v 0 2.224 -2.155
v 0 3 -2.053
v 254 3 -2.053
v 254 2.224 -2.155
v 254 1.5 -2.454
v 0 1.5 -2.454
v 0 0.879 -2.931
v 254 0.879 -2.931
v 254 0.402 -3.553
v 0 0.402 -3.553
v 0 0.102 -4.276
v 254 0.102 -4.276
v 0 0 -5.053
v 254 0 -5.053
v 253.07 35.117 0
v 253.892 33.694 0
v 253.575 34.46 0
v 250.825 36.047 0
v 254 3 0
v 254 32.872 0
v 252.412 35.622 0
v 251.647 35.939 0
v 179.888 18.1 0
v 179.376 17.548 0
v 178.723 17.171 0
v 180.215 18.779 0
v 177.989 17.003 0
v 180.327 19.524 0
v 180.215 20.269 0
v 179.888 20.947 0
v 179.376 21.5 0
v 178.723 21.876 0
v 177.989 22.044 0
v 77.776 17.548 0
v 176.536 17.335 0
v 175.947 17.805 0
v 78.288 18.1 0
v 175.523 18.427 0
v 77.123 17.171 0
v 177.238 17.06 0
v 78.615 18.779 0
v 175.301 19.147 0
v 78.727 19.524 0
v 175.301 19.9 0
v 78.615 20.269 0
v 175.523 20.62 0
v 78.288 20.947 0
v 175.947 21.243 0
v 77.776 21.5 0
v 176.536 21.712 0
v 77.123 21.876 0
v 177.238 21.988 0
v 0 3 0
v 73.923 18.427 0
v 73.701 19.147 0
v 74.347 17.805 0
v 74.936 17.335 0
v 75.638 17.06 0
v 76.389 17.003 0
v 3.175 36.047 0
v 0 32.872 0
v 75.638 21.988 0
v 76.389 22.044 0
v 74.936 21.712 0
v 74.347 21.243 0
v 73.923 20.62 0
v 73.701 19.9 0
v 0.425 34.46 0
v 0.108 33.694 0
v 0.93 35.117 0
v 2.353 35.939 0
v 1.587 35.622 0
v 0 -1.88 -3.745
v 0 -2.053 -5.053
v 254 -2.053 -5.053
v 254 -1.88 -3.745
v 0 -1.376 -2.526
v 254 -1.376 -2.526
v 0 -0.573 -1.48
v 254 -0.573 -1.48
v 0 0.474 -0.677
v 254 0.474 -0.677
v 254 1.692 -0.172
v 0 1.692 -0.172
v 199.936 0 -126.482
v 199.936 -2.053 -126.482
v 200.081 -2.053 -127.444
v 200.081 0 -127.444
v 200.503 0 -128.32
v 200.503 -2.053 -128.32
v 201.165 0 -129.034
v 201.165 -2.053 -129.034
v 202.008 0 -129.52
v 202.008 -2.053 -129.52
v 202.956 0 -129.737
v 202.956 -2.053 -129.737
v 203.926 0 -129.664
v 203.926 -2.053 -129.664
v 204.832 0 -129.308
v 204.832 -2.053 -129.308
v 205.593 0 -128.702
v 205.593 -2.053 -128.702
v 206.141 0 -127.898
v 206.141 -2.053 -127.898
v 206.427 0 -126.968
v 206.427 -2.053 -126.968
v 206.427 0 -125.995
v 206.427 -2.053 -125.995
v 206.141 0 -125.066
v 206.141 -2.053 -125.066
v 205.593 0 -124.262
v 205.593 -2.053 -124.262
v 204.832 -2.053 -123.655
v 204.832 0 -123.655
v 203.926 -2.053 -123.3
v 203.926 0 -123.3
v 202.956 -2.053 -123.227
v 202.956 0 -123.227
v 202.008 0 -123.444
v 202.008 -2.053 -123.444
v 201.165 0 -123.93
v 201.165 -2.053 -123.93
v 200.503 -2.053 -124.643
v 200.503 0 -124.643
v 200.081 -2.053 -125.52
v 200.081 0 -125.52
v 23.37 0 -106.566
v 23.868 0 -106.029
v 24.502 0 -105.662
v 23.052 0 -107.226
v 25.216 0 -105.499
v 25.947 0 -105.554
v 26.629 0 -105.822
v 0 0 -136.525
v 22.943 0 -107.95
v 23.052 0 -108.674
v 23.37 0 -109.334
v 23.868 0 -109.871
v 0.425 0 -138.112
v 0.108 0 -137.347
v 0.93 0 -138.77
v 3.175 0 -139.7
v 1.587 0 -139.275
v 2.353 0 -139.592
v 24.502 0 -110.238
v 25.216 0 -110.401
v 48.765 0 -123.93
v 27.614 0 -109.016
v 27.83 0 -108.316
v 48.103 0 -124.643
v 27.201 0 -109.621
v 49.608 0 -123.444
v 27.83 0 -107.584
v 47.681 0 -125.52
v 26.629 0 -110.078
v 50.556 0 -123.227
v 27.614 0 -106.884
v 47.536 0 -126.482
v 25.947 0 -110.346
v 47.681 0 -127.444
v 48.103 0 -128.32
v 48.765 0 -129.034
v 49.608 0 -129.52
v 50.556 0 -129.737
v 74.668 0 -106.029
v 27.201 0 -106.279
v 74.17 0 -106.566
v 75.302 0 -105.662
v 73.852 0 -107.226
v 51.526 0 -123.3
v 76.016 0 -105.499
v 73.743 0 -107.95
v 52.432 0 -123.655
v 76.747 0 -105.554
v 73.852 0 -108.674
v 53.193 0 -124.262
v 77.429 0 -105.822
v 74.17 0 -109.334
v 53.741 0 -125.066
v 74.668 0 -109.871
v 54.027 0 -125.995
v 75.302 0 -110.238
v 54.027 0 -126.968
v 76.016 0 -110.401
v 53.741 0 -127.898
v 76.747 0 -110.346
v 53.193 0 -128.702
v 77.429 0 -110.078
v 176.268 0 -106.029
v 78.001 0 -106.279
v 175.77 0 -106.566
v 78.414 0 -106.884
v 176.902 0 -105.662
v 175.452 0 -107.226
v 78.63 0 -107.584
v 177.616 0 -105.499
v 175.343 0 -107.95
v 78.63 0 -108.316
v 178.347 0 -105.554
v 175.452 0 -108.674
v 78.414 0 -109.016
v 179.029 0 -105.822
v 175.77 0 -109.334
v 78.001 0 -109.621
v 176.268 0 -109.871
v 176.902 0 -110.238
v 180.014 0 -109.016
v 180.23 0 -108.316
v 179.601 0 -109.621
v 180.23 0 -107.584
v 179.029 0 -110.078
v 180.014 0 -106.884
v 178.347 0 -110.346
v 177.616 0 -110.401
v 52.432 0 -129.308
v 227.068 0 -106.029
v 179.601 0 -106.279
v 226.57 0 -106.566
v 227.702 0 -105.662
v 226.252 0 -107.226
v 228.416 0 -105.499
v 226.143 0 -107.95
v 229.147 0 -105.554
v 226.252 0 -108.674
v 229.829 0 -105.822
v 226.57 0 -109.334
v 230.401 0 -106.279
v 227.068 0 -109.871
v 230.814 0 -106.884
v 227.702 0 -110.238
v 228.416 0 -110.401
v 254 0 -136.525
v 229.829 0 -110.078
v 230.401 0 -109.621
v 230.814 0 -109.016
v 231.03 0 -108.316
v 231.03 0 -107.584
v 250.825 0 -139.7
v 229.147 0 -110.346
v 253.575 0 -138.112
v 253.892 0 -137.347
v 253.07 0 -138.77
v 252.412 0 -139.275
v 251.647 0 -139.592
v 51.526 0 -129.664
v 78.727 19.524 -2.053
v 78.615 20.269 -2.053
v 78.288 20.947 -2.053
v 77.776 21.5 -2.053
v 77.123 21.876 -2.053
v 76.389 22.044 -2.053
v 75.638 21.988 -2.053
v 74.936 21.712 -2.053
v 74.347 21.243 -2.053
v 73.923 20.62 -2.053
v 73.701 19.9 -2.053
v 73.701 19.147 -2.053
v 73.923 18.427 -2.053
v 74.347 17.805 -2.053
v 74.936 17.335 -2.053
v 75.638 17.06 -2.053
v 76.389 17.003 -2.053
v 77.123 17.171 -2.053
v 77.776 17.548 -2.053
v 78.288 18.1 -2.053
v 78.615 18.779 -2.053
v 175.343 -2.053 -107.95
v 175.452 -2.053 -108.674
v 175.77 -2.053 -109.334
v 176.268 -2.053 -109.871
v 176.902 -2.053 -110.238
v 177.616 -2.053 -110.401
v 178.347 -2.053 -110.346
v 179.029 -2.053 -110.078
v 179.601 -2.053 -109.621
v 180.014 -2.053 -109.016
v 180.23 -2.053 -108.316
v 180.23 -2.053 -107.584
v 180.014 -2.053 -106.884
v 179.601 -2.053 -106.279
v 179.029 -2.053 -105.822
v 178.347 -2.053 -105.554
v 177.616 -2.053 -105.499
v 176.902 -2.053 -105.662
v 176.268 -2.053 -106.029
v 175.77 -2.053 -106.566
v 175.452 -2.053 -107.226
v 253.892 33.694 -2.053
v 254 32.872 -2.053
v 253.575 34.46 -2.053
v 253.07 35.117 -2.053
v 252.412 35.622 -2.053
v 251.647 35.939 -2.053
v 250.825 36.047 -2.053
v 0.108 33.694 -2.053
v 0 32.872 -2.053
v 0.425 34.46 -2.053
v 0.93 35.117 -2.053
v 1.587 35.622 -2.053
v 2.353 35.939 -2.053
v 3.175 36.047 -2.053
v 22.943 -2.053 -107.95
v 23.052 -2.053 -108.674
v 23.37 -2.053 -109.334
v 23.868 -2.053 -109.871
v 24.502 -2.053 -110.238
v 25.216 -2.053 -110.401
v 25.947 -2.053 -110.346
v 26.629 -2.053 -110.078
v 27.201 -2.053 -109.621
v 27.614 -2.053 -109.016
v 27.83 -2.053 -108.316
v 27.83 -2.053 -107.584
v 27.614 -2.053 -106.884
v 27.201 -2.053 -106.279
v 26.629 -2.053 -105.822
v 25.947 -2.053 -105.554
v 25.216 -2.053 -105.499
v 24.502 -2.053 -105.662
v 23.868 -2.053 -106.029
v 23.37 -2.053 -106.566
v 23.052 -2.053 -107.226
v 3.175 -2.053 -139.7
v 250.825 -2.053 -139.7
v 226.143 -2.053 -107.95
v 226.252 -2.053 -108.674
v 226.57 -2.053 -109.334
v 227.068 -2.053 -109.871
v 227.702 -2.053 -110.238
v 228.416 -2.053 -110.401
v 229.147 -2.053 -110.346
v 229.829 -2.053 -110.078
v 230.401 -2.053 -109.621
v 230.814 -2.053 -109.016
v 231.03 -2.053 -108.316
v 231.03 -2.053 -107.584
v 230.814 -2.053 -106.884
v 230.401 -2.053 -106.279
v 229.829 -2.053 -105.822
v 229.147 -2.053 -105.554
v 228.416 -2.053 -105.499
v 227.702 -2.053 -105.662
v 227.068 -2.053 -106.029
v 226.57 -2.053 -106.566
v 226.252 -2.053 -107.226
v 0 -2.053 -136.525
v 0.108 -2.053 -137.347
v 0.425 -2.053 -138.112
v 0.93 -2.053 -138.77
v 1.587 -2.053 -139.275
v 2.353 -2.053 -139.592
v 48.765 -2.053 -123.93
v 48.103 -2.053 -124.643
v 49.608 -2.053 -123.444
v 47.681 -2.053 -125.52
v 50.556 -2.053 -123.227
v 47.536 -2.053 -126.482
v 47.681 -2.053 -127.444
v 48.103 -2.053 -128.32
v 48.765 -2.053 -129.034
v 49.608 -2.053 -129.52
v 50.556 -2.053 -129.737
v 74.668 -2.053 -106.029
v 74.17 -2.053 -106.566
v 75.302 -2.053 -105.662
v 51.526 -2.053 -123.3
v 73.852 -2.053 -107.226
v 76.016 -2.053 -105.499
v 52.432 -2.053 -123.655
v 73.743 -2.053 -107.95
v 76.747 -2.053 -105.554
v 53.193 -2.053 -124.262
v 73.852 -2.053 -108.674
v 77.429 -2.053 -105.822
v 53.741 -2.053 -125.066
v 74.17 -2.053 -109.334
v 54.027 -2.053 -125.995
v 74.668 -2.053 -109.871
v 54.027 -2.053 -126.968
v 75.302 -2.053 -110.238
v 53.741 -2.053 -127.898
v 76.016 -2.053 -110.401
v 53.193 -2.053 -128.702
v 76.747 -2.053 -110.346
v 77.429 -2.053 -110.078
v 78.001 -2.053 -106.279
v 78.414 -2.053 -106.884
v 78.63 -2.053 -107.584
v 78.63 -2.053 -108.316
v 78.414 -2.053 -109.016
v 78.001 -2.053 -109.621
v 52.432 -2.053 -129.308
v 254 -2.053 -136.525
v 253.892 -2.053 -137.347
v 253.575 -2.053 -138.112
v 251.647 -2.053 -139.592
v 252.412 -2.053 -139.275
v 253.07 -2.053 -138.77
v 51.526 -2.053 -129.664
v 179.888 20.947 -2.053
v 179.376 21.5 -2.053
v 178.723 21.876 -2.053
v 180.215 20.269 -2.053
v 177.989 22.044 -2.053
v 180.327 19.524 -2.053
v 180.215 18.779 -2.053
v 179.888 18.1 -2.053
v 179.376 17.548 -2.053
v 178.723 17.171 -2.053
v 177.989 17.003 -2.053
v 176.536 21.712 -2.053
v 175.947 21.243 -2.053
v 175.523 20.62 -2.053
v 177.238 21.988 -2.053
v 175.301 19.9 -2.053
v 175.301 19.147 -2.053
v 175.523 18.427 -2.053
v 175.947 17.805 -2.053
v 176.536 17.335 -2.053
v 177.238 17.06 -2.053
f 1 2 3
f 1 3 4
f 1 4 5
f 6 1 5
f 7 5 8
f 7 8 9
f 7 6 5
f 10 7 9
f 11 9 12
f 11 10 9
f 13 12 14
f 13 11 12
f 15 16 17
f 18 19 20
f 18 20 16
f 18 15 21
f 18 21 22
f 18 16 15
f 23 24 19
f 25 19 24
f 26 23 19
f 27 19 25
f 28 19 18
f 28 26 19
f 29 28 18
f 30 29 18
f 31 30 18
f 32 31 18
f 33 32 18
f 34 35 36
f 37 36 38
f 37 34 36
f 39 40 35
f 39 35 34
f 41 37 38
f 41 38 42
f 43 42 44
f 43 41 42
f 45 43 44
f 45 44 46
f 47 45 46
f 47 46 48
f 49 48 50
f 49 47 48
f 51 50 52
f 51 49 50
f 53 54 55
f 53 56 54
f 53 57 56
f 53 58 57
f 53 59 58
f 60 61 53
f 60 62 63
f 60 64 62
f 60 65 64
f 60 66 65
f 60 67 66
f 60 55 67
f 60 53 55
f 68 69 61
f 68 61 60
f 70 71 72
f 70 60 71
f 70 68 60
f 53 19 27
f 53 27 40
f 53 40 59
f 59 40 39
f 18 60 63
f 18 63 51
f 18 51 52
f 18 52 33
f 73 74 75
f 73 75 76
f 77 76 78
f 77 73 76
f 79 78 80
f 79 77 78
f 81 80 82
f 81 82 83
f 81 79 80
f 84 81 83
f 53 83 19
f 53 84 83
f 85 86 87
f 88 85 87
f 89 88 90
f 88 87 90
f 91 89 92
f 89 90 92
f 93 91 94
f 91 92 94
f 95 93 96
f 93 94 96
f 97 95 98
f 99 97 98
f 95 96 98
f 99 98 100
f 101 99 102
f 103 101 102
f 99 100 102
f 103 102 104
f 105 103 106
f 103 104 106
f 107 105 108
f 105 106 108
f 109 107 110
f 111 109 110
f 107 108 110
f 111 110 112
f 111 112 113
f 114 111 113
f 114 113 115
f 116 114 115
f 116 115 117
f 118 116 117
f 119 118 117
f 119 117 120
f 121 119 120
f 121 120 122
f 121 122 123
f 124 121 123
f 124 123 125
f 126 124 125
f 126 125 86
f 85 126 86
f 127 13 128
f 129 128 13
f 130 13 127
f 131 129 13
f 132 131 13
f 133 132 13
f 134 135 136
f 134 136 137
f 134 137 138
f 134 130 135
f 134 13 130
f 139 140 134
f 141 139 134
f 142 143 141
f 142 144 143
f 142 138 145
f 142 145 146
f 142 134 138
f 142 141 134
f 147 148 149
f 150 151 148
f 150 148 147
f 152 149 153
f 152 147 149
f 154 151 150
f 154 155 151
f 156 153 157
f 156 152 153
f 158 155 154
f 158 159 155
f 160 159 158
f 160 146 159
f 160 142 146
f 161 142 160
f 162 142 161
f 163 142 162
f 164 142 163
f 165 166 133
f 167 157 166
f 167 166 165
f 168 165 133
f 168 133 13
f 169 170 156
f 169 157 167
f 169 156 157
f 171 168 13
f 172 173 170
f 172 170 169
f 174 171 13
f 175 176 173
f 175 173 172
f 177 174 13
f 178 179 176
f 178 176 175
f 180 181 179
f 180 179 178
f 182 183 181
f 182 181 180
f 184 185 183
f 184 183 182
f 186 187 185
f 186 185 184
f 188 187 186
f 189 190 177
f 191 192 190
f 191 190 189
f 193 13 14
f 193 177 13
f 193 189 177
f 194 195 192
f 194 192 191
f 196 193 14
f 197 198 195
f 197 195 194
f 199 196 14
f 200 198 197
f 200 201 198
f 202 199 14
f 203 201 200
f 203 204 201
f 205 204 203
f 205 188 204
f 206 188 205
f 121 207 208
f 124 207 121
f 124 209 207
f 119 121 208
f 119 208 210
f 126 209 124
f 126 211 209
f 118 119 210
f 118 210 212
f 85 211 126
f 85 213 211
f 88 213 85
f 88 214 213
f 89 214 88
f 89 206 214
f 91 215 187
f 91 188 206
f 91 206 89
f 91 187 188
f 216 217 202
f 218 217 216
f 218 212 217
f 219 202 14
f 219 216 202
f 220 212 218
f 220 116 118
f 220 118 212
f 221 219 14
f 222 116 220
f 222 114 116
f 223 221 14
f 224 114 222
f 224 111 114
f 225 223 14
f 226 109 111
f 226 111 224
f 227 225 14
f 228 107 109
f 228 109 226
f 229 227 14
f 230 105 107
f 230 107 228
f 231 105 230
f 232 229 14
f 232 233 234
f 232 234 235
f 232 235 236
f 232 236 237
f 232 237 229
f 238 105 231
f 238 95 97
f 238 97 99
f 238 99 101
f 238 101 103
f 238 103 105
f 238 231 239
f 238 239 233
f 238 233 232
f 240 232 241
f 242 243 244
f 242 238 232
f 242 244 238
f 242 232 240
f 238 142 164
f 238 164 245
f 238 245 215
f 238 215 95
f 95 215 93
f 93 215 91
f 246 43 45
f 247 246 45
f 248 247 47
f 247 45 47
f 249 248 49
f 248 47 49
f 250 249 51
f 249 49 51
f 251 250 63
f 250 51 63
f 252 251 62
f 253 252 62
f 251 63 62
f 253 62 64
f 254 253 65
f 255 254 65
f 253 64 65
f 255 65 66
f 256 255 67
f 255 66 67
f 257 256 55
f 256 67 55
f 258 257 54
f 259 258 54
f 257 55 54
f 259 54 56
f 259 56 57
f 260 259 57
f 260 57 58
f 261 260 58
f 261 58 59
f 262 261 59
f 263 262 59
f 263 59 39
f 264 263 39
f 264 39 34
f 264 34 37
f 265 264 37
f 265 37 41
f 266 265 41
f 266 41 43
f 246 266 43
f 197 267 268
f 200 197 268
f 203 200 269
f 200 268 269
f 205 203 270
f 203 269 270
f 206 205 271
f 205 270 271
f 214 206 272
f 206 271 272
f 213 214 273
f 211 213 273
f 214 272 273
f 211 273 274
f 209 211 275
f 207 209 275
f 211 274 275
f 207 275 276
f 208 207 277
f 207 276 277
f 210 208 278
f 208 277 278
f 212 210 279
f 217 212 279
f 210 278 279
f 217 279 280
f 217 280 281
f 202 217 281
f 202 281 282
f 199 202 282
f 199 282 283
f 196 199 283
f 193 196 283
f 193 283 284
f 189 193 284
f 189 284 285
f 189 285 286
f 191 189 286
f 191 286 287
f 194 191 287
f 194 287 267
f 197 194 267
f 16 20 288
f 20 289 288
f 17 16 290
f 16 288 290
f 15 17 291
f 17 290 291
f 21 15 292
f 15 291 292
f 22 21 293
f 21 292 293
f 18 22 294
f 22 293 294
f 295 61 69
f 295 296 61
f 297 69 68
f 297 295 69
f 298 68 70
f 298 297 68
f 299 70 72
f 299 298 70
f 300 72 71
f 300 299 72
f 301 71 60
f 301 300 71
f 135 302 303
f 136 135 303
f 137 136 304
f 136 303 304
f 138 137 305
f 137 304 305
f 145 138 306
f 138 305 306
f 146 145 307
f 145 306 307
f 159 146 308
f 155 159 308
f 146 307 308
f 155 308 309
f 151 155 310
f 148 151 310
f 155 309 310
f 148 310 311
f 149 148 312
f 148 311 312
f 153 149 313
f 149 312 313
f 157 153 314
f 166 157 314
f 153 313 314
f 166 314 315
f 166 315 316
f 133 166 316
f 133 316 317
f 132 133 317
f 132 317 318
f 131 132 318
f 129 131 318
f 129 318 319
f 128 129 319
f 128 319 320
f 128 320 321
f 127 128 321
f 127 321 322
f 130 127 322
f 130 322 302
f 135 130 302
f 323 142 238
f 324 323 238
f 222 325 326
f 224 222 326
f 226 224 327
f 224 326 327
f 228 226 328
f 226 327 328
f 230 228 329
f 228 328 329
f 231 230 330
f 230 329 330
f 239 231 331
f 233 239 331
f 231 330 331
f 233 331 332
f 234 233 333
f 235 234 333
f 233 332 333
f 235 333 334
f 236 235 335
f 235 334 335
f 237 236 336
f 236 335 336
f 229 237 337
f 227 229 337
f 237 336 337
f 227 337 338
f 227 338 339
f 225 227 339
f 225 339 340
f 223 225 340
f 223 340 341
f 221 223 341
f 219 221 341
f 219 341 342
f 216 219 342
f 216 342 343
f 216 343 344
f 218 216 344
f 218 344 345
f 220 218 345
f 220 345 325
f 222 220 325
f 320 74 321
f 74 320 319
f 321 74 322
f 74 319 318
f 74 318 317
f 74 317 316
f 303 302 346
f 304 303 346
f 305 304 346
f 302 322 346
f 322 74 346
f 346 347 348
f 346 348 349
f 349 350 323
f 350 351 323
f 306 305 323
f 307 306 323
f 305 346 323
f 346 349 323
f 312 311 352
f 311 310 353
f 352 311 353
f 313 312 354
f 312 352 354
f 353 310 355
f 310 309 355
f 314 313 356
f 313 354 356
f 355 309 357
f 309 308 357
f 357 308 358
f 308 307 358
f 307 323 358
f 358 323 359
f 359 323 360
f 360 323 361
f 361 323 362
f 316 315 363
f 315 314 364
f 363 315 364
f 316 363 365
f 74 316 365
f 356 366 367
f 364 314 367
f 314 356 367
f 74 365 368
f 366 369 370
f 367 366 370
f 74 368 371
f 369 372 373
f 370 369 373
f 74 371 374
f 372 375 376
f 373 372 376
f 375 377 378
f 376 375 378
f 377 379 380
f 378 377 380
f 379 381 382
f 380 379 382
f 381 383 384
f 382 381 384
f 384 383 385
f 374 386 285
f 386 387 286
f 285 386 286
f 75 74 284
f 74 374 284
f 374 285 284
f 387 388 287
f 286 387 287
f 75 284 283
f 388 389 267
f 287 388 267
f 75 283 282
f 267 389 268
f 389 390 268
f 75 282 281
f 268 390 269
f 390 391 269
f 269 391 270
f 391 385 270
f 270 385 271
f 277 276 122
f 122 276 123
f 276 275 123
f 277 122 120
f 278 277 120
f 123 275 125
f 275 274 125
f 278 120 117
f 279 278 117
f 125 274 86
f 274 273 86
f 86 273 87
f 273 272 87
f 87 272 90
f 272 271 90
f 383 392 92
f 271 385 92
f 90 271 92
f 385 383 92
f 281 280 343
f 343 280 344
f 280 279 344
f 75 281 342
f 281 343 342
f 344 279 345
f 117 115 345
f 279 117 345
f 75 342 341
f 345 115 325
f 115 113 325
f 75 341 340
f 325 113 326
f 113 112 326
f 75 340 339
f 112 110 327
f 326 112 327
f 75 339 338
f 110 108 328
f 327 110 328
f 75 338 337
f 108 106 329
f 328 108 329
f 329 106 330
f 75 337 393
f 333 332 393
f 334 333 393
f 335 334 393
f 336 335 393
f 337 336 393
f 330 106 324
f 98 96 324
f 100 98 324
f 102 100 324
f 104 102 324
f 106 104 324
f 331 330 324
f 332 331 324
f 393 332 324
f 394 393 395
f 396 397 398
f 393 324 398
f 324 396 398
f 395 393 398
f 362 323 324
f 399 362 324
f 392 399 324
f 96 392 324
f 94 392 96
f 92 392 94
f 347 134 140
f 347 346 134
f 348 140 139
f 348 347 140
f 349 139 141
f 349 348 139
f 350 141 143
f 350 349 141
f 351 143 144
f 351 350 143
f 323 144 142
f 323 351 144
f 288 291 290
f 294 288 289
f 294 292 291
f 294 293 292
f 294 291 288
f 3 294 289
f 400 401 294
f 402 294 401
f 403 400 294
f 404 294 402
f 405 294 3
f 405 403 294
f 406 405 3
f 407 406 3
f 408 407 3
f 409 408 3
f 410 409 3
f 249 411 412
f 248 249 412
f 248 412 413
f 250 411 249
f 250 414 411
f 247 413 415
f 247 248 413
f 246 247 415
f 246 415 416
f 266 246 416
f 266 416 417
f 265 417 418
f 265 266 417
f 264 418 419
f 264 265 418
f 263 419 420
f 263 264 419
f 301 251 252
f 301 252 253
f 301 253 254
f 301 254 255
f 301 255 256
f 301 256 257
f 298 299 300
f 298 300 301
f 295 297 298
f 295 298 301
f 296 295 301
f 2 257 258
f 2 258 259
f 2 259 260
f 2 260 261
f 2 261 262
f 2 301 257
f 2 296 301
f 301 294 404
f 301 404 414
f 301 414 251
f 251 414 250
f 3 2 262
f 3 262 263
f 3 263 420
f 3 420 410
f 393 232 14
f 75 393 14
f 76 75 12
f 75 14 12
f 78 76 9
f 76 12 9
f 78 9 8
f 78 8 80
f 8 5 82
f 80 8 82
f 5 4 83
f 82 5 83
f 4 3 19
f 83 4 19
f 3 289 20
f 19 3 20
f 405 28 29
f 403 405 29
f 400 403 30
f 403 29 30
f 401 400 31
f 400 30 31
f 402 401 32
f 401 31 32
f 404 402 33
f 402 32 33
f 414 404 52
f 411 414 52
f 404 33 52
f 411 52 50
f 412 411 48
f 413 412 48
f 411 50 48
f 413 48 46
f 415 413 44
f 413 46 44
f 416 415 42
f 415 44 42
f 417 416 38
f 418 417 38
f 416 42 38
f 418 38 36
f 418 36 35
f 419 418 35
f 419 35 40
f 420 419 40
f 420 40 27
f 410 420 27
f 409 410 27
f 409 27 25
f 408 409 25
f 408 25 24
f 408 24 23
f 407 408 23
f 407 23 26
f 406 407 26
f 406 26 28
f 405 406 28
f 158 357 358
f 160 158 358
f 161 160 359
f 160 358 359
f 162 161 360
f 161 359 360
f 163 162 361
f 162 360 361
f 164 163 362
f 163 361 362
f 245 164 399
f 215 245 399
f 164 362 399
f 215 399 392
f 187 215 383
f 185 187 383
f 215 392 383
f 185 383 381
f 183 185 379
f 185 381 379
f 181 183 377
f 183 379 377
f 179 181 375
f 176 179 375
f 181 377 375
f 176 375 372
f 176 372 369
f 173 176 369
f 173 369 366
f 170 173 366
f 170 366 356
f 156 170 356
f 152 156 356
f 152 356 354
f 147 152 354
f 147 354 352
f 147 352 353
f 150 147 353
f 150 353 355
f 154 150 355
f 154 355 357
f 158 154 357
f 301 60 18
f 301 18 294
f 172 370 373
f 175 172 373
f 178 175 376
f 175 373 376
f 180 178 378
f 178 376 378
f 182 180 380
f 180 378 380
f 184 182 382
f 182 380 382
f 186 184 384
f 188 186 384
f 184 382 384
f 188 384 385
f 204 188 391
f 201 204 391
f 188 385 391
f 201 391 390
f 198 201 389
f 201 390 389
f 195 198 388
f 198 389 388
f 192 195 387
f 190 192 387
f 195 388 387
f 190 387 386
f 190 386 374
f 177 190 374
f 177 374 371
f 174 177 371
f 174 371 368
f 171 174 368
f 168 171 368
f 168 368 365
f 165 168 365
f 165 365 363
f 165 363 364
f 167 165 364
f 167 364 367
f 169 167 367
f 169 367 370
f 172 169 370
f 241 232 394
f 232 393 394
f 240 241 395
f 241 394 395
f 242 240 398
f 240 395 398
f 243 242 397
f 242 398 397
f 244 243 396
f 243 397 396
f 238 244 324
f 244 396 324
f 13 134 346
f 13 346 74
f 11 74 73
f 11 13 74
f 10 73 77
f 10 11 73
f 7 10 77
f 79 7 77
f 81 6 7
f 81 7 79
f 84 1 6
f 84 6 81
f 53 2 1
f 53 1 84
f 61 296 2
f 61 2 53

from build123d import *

# Parameters (mm, degrees)
SKETCH1_W                    = 254
SKETCH1_H                    = 139.7
BASE_FLANGE1_DEPTH           = 2.052574
EDGE_FLANGE1_STRIP_W         = 14.210296
EDGE_FLANGE1_STRIP_H         = 2.052574
EDGE_FLANGE1_STRIP_CUT_DEPTH = 254
EDGE_FLANGE1_DEPTH           = 254
F_8_0_199_DIAMETER_HOLE1_D   = 5.0546
F_10_0_1935_DIAMETER_HOLE1_D = 4.9149
F_0_257_DIAMETER_HOLE1_D     = 6.5278
FILLET1_R                    = 3.175


# Sheet-metal steps are written as plain solids
with BuildPart() as part:
    # Sketch1 → Base-Flange1 (new body)
    with BuildSketch(Plane(origin=(0, 0, 0), x_dir=(1, 0, 0), z_dir=(0, 1, 0))):
        with Locations((127, 69.85)):
            Rectangle(SKETCH1_W, SKETCH1_H)
    extrude(amount=-BASE_FLANGE1_DEPTH)

    # Edge-Flange1 strip (across the edge) → Edge-Flange1 strip cut (cut)
    with BuildSketch(Plane(origin=(0, 0, 0), x_dir=(0, 0, -1), z_dir=(1, 0, 0))):
        with Locations((-2.052574, -1.026287)):
            Rectangle(EDGE_FLANGE1_STRIP_W, EDGE_FLANGE1_STRIP_H)
    extrude(amount=EDGE_FLANGE1_STRIP_CUT_DEPTH, mode=Mode.SUBTRACT)

    # Edge-Flange1 section (across the edge) → Edge-Flange1 (add)
    with BuildSketch(Plane(origin=(0, 0, 0), x_dir=(0, 0, -1), z_dir=(1, 0, 0))):
        with BuildLine():
            Line((0, 3), (0, 36.047426))
            Line((0, 36.047426), (2.052574, 36.047426))
            Line((2.052574, 36.047426), (2.052574, 3))
            ThreePointArc((2.052574, 3), (2.931253656, 0.878679656), (5.052574, 0))
            Line((5.052574, 0), (5.052574, -2.052574))
            ThreePointArc((5.052574, -2.052574), (1.479864662, -0.572709338), (0, 3))
        make_face()
    extrude(amount=EDGE_FLANGE1_DEPTH)

    # #8 (0.199) Diameter Hole1 (through all)
    with Locations(Plane(origin=(0, 0, -2.052574), x_dir=(-1, 0, 0), z_dir=(0, 0, -1))):
        with Locations((-177.8, 19.523713), (-76.2, 19.523713)):
            Hole(F_8_0_199_DIAMETER_HOLE1_D / 2)

    # #10 (0.1935) Diameter Hole1 (through all)
    with Locations(Plane(origin=(0, 0, 0), x_dir=(1, 0, 0), z_dir=(0, 1, 0))):
        with Locations((25.4, 107.95), (76.2, 107.95), (177.8, 107.95), (228.6, 107.95)):
            Hole(F_10_0_1935_DIAMETER_HOLE1_D / 2)

    # F (0.257) Diameter Hole1 (through all)
    with Locations(Plane(origin=(0, 0, 0), x_dir=(1, 0, 0), z_dir=(0, 1, 0))):
        with Locations((203.2, 126.48184), (50.8, 126.48184)):
            Hole(F_0_257_DIAMETER_HOLE1_D / 2)

    # Fillet1
    fillet1_edges = [part.edges().sort_by_distance(p)[0] for p in [
        (0, 36.047426, -1.026287),
        (254, 36.047426, -1.026287),
        (0, -1.026287, -139.7),
        (254, -1.026287, -139.7),
    ]]
    fillet(fillet1_edges, radius=FILLET1_R)


solid = part.part
